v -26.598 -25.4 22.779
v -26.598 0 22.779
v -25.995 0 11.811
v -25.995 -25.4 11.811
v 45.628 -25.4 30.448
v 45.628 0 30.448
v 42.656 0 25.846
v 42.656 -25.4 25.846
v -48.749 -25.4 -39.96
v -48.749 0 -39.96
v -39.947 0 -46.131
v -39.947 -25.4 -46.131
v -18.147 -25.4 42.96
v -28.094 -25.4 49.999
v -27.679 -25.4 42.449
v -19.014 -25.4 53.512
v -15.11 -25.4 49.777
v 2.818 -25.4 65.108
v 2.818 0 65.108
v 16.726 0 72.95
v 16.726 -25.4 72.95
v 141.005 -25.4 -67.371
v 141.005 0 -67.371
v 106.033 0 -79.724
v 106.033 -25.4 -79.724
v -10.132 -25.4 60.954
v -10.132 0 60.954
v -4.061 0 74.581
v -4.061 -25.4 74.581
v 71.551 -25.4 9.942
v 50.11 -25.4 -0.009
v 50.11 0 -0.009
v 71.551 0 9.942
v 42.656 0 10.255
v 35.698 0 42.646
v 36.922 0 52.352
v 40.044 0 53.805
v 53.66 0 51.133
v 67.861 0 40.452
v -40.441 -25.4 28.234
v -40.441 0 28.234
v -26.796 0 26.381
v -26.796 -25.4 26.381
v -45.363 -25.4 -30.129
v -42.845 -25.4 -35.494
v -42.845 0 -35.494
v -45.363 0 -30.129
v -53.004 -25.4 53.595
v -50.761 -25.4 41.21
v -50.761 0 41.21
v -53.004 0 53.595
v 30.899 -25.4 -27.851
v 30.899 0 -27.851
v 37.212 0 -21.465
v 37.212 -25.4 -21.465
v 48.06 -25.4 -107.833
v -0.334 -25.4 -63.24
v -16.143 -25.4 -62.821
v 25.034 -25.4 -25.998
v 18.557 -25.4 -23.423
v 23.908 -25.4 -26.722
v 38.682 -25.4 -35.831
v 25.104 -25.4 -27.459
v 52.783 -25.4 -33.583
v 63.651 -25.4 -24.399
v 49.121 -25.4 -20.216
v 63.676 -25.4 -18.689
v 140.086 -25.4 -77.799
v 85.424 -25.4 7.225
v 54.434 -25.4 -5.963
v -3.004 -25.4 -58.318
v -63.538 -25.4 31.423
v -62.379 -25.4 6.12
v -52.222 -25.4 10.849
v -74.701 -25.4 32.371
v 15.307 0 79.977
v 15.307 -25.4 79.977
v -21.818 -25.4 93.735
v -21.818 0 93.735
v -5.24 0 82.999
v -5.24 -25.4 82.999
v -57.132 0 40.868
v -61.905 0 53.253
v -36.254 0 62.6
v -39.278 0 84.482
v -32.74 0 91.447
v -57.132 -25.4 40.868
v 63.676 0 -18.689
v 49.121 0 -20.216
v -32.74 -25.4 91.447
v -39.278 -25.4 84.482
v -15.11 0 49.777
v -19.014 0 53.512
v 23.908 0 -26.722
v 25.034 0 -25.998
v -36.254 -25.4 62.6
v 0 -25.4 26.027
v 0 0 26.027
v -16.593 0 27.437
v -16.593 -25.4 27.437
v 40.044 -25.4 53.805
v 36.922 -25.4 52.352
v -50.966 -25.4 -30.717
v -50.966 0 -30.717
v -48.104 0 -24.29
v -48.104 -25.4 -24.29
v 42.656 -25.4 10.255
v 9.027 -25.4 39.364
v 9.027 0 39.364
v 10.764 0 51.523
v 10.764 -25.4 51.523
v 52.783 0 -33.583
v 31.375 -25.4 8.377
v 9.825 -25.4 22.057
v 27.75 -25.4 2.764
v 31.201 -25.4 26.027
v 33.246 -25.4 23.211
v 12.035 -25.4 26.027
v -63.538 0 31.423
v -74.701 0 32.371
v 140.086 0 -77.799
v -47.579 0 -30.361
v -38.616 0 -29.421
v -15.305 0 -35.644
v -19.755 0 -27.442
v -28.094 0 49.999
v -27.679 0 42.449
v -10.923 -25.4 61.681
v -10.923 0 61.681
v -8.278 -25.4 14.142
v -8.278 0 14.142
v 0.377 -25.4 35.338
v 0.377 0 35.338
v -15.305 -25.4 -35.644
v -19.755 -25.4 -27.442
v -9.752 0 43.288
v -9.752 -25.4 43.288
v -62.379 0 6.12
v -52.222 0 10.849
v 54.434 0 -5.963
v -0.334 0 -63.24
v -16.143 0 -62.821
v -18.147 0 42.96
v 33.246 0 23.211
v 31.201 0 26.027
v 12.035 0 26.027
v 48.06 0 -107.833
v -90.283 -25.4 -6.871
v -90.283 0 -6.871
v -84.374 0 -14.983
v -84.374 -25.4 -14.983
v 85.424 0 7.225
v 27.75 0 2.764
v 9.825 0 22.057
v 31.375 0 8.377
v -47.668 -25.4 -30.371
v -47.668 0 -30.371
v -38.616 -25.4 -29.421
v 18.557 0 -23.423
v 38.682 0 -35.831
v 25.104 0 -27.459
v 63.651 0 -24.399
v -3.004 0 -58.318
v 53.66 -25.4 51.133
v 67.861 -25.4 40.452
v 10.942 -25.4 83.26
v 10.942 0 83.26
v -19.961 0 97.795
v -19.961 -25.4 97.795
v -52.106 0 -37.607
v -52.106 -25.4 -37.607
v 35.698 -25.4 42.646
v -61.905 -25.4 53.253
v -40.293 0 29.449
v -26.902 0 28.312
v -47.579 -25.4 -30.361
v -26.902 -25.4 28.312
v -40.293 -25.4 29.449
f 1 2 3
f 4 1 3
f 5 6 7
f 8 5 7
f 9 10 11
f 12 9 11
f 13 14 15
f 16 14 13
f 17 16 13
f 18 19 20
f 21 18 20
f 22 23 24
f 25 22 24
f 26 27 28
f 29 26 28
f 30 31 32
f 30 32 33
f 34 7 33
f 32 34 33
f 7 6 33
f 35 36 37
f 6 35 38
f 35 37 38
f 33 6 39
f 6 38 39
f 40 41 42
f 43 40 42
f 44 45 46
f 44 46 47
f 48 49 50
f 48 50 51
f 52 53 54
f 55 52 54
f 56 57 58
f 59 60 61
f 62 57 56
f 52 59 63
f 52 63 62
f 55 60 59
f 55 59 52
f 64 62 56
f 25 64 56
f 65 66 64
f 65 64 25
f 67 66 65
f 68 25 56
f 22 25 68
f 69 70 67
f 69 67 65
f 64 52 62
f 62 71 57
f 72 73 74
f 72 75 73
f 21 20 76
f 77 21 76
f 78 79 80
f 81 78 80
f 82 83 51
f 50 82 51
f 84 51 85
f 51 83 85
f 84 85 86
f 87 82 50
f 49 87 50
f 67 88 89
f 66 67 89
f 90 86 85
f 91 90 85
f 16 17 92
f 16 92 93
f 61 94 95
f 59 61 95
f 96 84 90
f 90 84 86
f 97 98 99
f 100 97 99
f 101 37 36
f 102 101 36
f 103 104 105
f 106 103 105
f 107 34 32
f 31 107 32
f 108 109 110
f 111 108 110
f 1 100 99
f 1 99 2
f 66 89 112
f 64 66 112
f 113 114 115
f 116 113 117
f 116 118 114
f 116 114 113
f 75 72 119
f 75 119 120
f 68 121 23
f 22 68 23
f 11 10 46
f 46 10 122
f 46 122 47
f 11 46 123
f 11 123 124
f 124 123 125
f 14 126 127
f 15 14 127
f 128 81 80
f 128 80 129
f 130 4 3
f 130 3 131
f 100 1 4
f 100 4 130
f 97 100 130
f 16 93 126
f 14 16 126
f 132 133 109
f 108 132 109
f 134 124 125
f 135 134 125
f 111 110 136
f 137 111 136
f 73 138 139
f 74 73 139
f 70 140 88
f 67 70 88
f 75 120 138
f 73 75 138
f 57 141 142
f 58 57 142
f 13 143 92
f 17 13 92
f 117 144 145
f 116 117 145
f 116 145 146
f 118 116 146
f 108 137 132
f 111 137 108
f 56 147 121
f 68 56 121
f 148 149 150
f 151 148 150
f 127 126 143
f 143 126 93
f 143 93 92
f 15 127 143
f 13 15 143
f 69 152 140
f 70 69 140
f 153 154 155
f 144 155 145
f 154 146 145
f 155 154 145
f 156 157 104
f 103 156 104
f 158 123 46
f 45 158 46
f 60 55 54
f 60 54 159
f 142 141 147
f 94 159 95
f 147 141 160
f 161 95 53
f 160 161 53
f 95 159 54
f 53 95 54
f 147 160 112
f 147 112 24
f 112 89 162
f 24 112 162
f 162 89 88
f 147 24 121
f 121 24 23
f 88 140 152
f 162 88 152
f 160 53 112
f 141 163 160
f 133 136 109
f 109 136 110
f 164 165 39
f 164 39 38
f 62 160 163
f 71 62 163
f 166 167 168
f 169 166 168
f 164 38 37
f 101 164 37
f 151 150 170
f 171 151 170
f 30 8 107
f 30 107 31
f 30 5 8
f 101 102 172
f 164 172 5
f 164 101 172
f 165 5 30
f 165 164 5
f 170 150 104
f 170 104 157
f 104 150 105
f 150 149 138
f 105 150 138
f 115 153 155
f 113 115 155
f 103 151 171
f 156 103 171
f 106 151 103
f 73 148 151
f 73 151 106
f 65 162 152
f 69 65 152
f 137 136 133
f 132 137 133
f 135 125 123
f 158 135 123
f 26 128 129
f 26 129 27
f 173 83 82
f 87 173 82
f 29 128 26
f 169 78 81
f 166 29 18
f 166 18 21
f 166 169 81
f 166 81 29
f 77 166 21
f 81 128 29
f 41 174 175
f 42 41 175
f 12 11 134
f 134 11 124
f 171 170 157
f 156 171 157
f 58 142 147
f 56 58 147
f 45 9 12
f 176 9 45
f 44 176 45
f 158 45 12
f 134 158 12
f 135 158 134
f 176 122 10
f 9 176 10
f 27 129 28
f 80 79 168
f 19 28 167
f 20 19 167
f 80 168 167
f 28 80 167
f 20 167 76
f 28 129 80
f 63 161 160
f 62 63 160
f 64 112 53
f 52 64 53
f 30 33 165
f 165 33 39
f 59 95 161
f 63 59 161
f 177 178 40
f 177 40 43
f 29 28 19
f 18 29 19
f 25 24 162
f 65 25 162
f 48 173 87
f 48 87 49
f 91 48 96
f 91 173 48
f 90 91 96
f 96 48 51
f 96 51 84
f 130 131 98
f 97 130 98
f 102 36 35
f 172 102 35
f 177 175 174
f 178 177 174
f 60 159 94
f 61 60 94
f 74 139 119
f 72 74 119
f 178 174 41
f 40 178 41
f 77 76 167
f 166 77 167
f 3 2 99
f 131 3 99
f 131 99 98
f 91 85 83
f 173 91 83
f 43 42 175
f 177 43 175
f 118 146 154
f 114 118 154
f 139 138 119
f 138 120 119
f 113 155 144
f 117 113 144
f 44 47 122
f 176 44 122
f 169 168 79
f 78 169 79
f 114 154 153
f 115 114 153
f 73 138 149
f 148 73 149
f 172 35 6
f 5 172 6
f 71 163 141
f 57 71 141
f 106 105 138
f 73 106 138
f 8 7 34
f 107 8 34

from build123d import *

# Parameters (mm, degrees)
F1_DEPTH = 25.4


with BuildPart() as f1:
    # F0 (on Front) → F1 (new body)
    with BuildSketch(Plane.XZ):
        Polygon((-8.2775503208, 14.1415705085), (0, 26.0273497552), (-16.5933340886, 27.4365707117), (-26.5976804775, 22.7788339356), (-25.9946774803, 11.8107815519), align=None)
    extrude(amount=F1_DEPTH)


with BuildPart() as f1b:
    # F0 (on Front) → F1, piece 2 (new body)
    with BuildSketch(Plane.XZ):
        Polygon((9.8245315285, 22.0570616703), (27.7499896085, 2.7637792612), (31.3745177308, 8.3765039567), (33.2459360691, 23.2114415528), (31.2008630456, 26.0273497552), (12.0347946233, 26.0273497552), align=None)
    extrude(amount=F1_DEPTH)


with BuildPart() as f1c:
    # F0 (on Front) → F1, piece 3 (new body)
    with BuildSketch(Plane.XZ):
        Polygon((-9.7521655262, 43.2884246111), (0.377061074, 35.3375000258), (9.0266028078, 39.3644786073), (10.7635590371, 51.5231762454), align=None)
    extrude(amount=F1_DEPTH)


with BuildPart() as f1d:
    # F0 (on Front) → F1, piece 4 (new body)
    with BuildSketch(Plane.XZ):
        Polygon((-26.7957196178, 26.3809779969), (-26.9018860354, 28.3120444023), (-40.2927486587, 29.4492892823), (-40.4407623715, 28.2343438209), align=None)
    extrude(amount=F1_DEPTH)


with BuildPart() as f1e:
    # F0 (on Front) → F1, piece 5 (new body)
    with BuildSketch(Plane.XZ):
        Polygon((-27.6790868411, 42.4485896423), (-18.1467949534, 42.9602892179), (-15.1103850066, 49.7767484798), (-19.0138577454, 53.5115502348), (-28.0942054441, 49.9992031622), align=None)
    extrude(amount=F1_DEPTH)


with BuildPart() as f1f:
    # F0 (on Front) → F1, piece 6 (new body)
    with BuildSketch(Plane.XZ):
        Polygon((-4.0613790776, 74.5807440262), (2.8184896701, 65.1076941085), (16.7262681572, 72.9500804147), (15.3070834712, 79.9770611173), (10.9419030966, 83.2600112295), (-19.9605801177, 97.7949294743), (-21.8179547803, 93.7347027441), (-5.2396552637, 82.998521626), (-10.9227559582, 61.6807035146), (-10.1316010064, 60.9536576932), align=None)
    extrude(amount=F1_DEPTH)


with BuildPart() as f1g:
    # F0 (on Front) → F1, piece 7 (new body)
    with BuildSketch(Plane.XZ):
        Polygon((-53.0043693492, 53.5945301139), (-36.2540241362, 62.6004746449), (-32.7397064753, 91.447155212), (-39.2784316626, 84.4816475651), (-61.9047880588, 53.2532913941), (-57.1322903783, 40.867522683), (-50.7614407107, 41.2095140015), align=None)
    extrude(amount=F1_DEPTH)


with BuildPart() as f1h:
    # F0 (on Front) → F1, piece 8 (new body)
    with BuildSketch(Plane.XZ):
        Polygon((-62.3786299077, 6.1202499996), (-52.2224069815, 10.848696136), (-63.5382242926, 31.4234562117), (-74.7011477181, 32.3714890509), align=None)
    extrude(amount=F1_DEPTH)


with BuildPart() as f1i:
    # F0 (on Front) → F1, piece 9 (new body)
    with BuildSketch(Plane.XZ):
        Polygon((-39.947044008, -46.1311363055), (-15.3050767152, -35.643806509), (-19.7545978755, -27.4421568495), (-38.6155735952, -29.4209610913), (-42.8447596543, -35.4936722127), (-45.3630345792, -30.12887274), (-47.5793322149, -30.3613961909), (-48.7487289594, -39.9601910635), align=None)
    extrude(amount=F1_DEPTH)


with BuildPart() as f1j:
    # F0 (on Front) → F1, piece 10 (new body)
    with BuildSketch(Plane.XZ):
        Polygon((-50.9664304554, -30.7167544961), (-48.1037262207, -24.2902484787), (-62.3786299077, 6.1202499996), (-90.2834418248, -6.8714301805), (-84.3736491186, -14.9832198626), (-52.1055814784, -37.6066697555), (-47.6679858226, -30.3706973075), align=None)
    extrude(amount=F1_DEPTH)


with BuildPart() as f1k:
    # F0 (on Front) → F1, piece 11 (new body)
    with BuildSketch(Plane.XZ):
        Polygon((85.4236853653, 7.2251631385), (54.4344372496, -5.9634942959), (63.6764039087, -18.688971294), (49.120557909, -20.2161017159), (52.7831368829, -33.582583536), (30.8986216103, -27.8509301128), (37.2123704158, -21.4654523473), (18.5571143493, -23.4226734575), (23.9078568819, -26.7217250352), (25.0344755149, -25.9977193516), (25.1040715001, -27.4592626198), (38.6821180582, -35.830937326), (-3.0041410369, -58.3176991105), (-0.3337582805, -63.2399240051), (-16.1427256153, -62.8205709006), (48.0596655795, -107.8334795256), (140.0860498561, -77.7991094976), (141.0047548768, -67.370930717), (106.0325218358, -79.7235865211), (63.6513456702, -24.3992414325), align=None)
    extrude(amount=F1_DEPTH)


with BuildPart() as f1l:
    # F0 (on Front) → F1, piece 12 (new body)
    with BuildSketch(Plane.XZ):
        Polygon((42.6559373736, 25.8462270468), (42.6559373736, 10.2545937769), (50.109830102, -0.0088429957), (71.5507794352, 9.9415641206), (67.8611167444, 40.4524012804), (53.6601199049, 51.132639018), (40.0438383938, 53.8052139902), (36.9219696666, 52.3517614391), (35.6976277022, 42.6462689432), (45.6275527562, 30.4478906235), align=None)
    extrude(amount=F1_DEPTH)


solid = Compound([f1.part, f1b.part, f1c.part, f1d.part, f1e.part, f1f.part, f1g.part, f1h.part, f1i.part, f1j.part, f1k.part, f1l.part])
